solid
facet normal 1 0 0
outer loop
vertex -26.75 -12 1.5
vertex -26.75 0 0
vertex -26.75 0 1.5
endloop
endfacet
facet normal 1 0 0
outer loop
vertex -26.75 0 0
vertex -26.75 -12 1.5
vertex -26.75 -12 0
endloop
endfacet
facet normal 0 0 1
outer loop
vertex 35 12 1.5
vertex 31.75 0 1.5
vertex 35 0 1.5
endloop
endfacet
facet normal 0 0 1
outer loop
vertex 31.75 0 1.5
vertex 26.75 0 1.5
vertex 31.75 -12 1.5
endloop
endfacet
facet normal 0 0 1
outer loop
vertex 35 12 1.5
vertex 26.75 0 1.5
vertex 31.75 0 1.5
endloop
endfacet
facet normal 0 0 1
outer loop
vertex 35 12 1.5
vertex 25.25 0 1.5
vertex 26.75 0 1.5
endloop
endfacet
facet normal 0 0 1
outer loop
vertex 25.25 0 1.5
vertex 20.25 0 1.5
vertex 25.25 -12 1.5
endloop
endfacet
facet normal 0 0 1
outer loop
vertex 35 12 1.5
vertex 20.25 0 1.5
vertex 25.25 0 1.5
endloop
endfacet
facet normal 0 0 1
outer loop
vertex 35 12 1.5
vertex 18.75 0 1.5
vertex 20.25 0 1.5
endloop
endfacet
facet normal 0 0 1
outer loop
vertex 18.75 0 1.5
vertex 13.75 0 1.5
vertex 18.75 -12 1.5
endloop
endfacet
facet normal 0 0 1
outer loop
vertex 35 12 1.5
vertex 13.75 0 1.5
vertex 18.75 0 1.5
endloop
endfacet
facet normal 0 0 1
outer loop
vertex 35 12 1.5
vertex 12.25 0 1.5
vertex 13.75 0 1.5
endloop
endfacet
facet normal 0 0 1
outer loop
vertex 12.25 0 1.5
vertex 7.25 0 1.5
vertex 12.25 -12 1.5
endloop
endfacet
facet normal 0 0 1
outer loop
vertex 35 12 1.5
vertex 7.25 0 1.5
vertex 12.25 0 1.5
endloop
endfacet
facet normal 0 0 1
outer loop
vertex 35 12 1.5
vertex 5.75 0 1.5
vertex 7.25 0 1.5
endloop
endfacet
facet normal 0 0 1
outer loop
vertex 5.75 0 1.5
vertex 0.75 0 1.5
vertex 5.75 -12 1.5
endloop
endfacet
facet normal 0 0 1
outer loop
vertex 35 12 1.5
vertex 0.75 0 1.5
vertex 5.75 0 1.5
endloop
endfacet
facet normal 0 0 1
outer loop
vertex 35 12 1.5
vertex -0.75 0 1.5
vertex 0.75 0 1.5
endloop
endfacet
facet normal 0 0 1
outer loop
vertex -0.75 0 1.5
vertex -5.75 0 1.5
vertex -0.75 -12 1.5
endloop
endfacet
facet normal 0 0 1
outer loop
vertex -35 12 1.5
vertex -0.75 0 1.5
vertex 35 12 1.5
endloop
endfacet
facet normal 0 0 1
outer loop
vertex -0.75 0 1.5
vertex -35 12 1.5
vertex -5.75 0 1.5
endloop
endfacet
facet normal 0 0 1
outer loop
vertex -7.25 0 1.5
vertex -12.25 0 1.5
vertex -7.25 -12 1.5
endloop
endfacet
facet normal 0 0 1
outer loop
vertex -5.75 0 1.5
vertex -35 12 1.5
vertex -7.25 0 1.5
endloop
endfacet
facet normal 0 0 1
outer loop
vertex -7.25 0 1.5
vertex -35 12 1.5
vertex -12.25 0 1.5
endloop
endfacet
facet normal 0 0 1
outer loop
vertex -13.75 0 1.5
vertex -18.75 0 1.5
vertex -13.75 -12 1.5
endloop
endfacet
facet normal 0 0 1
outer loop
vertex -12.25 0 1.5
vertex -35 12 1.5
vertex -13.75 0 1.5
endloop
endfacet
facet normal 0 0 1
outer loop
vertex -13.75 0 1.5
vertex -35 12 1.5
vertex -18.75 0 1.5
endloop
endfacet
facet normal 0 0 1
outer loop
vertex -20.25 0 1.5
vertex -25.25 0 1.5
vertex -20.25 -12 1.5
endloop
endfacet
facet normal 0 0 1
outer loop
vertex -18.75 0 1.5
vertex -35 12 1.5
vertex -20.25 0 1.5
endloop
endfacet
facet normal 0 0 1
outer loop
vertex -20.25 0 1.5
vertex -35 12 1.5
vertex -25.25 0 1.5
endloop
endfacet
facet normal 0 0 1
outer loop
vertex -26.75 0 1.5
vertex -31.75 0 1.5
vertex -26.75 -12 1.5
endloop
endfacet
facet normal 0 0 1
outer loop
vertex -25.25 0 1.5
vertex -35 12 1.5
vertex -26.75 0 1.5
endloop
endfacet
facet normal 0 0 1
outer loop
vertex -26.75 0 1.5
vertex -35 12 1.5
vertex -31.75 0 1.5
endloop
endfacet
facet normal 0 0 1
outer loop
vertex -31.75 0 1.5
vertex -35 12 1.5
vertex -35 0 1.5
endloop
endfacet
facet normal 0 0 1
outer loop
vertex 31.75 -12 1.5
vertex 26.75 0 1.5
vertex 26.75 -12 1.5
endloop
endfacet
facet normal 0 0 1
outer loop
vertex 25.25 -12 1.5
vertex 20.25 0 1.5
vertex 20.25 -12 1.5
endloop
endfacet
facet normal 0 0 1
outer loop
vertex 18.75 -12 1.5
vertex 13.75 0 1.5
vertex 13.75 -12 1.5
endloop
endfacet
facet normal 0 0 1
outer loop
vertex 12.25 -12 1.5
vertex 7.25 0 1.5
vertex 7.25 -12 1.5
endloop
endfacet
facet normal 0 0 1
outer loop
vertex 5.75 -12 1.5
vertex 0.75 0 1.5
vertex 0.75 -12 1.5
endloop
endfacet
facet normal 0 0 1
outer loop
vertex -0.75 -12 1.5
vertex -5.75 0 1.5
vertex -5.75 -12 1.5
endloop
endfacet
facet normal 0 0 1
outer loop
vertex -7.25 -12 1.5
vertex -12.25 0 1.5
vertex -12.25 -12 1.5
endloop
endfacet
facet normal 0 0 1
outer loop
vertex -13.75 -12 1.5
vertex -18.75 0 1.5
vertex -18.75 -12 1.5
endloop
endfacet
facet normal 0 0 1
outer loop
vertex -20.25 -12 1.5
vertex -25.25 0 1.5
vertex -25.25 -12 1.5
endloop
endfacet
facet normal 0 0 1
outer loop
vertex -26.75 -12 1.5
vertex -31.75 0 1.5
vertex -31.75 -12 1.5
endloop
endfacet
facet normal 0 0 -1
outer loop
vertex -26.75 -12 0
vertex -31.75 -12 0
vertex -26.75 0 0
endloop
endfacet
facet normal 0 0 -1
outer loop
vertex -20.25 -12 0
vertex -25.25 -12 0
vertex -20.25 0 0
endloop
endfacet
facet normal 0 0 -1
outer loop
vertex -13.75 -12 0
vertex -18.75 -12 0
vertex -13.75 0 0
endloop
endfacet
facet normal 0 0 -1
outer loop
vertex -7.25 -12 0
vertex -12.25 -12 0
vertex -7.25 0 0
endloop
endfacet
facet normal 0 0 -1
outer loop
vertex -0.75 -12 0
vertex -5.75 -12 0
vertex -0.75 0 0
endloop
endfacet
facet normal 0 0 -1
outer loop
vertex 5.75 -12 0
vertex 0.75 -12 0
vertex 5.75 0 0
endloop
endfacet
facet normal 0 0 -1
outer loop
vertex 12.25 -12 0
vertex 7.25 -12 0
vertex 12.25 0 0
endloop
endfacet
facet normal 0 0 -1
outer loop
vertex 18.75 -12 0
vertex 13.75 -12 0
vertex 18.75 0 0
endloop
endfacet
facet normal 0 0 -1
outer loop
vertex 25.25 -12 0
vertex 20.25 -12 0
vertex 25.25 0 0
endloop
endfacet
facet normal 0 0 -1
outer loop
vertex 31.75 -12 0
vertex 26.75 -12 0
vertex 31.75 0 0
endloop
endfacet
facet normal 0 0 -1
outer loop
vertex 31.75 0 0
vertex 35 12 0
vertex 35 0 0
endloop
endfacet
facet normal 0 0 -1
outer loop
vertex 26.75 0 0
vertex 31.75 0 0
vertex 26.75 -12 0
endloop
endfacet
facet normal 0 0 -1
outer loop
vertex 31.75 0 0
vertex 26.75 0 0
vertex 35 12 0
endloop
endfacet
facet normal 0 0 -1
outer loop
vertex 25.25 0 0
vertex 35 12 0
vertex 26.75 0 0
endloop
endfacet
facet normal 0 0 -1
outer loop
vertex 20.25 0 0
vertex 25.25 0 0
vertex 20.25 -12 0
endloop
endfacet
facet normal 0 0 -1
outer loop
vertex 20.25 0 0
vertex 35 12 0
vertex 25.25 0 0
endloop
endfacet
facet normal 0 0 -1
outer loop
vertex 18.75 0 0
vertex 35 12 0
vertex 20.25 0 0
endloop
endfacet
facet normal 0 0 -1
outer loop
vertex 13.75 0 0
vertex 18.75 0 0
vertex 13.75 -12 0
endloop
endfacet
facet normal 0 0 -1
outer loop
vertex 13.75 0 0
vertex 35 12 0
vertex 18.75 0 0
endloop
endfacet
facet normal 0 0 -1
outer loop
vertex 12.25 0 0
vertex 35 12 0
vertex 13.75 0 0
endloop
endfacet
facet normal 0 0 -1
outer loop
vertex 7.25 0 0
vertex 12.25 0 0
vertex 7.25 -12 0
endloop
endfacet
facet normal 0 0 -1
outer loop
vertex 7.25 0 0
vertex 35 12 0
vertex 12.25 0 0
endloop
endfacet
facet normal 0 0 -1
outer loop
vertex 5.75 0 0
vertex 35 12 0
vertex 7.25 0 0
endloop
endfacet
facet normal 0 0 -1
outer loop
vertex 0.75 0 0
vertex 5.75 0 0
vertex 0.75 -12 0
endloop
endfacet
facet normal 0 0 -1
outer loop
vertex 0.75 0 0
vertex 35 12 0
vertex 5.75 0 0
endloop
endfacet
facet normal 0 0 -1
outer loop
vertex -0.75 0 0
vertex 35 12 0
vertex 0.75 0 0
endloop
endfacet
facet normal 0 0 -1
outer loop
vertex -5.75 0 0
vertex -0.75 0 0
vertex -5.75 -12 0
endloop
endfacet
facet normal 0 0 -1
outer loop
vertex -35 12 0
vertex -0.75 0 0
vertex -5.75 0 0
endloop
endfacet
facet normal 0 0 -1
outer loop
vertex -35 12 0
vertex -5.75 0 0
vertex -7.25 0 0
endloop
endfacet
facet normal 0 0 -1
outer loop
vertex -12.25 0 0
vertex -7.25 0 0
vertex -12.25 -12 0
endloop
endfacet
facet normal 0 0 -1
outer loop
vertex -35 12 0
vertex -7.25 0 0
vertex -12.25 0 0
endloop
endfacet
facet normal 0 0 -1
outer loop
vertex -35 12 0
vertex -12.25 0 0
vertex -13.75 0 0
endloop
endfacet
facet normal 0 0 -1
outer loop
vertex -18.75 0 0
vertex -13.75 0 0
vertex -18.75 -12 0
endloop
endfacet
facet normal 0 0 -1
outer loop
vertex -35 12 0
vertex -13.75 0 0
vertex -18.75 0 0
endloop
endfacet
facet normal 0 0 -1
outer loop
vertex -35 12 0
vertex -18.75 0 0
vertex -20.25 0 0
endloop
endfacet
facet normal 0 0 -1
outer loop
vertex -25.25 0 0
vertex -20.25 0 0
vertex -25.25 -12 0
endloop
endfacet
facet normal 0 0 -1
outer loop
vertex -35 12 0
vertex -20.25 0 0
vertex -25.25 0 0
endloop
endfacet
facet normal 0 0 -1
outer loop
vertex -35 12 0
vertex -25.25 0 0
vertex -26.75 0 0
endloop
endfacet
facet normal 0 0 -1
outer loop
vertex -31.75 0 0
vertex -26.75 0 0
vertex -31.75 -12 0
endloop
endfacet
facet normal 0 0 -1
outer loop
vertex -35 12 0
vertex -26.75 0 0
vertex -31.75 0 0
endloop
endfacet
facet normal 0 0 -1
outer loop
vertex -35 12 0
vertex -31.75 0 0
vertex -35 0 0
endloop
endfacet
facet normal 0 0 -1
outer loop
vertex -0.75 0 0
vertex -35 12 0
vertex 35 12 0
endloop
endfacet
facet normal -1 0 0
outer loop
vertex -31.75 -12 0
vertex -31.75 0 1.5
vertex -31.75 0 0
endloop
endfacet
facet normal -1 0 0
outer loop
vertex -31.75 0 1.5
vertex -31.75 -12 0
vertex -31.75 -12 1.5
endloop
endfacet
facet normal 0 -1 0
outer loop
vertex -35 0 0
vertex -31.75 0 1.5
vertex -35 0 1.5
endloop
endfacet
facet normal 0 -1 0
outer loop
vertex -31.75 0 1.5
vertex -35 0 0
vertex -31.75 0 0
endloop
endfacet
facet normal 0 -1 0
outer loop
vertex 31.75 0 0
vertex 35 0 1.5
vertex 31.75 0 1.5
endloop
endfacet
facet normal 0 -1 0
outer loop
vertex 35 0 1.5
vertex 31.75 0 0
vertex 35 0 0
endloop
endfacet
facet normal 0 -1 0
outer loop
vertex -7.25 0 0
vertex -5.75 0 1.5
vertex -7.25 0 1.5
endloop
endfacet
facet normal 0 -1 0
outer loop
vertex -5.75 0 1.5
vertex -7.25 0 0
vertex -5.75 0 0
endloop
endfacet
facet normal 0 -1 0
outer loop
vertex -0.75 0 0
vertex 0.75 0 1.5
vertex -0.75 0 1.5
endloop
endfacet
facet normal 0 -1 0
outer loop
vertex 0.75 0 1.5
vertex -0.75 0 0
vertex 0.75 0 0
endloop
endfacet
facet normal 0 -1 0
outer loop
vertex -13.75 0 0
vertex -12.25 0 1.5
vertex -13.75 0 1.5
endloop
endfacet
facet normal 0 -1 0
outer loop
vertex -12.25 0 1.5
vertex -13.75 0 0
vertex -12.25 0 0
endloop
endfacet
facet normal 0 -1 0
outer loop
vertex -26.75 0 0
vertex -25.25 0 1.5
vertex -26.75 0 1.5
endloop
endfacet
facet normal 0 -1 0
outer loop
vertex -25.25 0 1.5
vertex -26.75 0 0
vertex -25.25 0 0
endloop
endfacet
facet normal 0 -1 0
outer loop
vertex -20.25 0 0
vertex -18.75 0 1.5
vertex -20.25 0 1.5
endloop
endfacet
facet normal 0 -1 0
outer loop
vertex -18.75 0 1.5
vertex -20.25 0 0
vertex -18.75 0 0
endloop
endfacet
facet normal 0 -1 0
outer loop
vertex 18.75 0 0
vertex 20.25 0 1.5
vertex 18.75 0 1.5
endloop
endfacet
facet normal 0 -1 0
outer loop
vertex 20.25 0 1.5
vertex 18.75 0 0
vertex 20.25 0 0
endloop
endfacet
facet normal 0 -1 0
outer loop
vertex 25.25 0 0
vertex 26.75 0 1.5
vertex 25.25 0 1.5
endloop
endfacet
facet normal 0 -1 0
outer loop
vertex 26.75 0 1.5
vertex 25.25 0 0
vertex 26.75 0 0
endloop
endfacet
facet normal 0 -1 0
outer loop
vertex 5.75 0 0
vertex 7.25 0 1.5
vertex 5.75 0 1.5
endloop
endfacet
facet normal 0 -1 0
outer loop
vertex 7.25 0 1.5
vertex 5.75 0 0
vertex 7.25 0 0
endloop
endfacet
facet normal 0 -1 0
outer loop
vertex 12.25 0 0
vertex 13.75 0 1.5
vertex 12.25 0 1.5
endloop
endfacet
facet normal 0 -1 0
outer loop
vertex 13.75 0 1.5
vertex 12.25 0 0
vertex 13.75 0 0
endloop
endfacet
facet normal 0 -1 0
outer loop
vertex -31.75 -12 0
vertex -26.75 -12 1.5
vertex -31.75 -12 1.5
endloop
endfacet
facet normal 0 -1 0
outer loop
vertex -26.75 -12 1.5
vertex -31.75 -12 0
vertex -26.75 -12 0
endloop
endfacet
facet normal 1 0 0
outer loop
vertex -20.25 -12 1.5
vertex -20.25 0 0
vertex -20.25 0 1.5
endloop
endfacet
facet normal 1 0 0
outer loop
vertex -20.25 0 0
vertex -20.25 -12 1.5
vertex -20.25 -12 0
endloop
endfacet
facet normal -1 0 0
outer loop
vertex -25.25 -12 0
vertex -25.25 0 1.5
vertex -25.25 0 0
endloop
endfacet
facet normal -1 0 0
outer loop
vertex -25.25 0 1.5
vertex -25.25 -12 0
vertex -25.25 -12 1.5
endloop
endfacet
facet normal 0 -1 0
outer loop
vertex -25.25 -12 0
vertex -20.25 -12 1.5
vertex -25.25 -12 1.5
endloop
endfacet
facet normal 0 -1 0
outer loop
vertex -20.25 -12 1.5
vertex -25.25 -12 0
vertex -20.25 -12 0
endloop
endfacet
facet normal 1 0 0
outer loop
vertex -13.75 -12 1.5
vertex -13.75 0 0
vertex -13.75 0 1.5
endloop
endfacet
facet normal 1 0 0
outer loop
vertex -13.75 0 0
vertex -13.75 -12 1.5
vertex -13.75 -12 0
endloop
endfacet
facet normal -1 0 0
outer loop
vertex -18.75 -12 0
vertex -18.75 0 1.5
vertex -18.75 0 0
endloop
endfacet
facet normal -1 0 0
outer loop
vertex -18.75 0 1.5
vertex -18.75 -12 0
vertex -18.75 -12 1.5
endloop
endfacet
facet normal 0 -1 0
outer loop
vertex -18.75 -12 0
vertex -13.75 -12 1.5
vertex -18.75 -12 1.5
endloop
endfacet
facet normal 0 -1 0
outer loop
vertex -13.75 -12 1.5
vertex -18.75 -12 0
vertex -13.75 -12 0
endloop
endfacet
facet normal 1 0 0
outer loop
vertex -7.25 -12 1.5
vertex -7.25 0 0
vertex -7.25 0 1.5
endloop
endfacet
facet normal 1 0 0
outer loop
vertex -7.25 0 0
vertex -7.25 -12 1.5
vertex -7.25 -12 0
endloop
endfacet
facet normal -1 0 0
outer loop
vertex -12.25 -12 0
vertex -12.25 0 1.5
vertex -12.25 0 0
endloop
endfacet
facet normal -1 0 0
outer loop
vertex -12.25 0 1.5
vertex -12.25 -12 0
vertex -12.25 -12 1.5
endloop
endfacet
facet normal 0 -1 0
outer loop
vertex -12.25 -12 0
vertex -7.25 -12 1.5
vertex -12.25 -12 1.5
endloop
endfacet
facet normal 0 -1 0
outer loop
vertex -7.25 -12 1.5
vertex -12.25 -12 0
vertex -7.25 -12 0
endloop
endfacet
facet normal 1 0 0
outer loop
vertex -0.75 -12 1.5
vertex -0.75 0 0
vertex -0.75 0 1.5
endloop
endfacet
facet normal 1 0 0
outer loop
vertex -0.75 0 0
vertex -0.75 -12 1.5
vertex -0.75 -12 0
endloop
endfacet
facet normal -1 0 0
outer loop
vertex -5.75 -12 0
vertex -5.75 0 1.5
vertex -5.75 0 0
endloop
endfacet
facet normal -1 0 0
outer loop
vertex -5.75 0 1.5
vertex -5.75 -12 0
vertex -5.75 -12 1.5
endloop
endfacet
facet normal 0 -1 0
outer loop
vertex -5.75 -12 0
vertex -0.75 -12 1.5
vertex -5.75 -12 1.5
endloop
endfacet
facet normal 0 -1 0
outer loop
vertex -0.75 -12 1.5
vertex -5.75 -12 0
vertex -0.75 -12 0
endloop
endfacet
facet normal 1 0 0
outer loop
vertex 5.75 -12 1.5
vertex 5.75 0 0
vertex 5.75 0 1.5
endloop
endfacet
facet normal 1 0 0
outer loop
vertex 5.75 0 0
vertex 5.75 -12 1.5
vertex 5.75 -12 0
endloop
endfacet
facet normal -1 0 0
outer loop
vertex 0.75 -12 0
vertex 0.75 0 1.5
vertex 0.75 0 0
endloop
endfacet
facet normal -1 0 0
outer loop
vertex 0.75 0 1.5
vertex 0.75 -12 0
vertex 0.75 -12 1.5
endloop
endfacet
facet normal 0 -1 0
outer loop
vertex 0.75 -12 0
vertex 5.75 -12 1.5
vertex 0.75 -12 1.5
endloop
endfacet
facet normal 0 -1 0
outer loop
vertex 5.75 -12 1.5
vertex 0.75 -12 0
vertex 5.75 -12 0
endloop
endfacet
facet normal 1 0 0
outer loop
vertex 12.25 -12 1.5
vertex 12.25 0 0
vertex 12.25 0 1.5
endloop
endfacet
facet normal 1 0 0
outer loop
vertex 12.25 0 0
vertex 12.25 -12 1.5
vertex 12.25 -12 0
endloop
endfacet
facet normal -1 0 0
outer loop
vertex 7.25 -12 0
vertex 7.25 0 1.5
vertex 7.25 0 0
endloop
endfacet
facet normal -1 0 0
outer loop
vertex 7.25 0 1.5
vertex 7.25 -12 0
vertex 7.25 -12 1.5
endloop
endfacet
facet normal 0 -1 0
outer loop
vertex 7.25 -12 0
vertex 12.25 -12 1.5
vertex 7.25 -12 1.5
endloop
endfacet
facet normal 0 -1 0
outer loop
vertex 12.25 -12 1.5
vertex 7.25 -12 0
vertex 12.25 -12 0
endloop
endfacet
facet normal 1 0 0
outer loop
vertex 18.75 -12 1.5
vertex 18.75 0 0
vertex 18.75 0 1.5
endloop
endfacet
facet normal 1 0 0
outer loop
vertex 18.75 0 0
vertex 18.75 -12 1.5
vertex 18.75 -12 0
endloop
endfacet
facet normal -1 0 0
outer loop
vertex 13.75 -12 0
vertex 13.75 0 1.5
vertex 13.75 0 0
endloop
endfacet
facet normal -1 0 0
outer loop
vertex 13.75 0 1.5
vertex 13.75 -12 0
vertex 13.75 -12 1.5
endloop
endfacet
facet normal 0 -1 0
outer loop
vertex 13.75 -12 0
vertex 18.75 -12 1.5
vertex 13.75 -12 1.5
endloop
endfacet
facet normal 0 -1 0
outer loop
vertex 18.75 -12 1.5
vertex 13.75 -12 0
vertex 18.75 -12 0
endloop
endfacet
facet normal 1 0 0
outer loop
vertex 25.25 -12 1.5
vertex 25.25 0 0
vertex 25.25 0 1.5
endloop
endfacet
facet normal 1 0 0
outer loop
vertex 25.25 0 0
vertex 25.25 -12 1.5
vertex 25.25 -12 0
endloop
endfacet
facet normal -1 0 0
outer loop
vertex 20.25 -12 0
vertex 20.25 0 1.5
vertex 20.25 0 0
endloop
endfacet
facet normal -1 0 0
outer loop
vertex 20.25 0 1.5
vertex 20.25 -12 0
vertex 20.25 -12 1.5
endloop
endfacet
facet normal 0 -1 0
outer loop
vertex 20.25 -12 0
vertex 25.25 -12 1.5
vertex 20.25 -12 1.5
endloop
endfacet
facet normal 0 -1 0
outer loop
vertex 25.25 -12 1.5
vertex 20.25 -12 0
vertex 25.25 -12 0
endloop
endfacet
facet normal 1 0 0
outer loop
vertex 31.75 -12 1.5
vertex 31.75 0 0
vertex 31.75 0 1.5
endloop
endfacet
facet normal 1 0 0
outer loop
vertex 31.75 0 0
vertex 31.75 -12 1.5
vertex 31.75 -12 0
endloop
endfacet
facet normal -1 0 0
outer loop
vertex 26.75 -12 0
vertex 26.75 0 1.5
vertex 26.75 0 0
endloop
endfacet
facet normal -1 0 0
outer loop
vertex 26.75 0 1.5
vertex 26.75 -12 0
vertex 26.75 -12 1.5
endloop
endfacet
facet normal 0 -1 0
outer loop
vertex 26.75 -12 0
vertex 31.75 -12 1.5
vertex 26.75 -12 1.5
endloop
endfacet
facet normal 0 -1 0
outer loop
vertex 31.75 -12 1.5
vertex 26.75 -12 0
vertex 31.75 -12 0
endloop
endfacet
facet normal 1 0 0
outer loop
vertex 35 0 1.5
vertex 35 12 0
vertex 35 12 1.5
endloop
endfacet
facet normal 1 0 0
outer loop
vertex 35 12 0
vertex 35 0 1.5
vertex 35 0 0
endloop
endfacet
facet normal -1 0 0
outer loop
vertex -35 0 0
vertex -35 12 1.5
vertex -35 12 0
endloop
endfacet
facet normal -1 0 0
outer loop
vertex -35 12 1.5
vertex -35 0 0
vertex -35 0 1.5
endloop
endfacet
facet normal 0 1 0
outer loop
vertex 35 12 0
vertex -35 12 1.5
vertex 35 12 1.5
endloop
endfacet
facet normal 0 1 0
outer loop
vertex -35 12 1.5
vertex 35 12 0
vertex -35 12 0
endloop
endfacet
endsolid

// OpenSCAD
// 10-well comb for casting agarose gels
// Print orientation: flat on bed, spine (back bar) along +X, teeth in -Y

// ---------- Parameters ----------
spine_len   = 70;    // spine length along X (mm)
spine_wid   = 12;    // spine width along Y (mm)
plate_thk   = 1.5;   // comb plate thickness along Z (mm)

tooth_count = 10;    // number of teeth
tooth_w     = 5.0;   // tooth width along X (mm)
tooth_l     = 12;    // tooth length along Y (mm)
tooth_gap   = 1.5;   // gap between neighbouring teeth (mm)

eps         = 0.5;   // cutter overshoot past faces (mm)

$fn = 64;

// ---------- Derived ----------
pitch   = tooth_w + tooth_gap;              // centre-to-centre spacing
x_start = -(tooth_count - 1) * pitch / 2;   // first tooth centre, row centred on spine

// ---------- Model ----------
union() {
    // Spine (back bar)
    translate([-spine_len / 2, 0, 0])
        cube([spine_len, spine_wid, plate_thk]);

    // Teeth hanging in -Y
    for (i = [0 : tooth_count - 1])
        translate([x_start + i * pitch - tooth_w / 2, -tooth_l, 0])
            cube([tooth_w, tooth_l, plate_thk]);
}

// Cut the 10 square wells from the top face
difference() {
    // (teeth + spine) union as one solid
    union() {
        translate([-spine_len / 2, 0, 0])
            cube([spine_len, spine_wid, plate_thk]);
        for (i = [0 : tooth_count - 1])
            translate([x_start + i * pitch - tooth_w / 2, -tooth_l, 0])
                cube([tooth_w, tooth_l, plate_thk]);
    }

    // Well cutters, extended past the top face
    for (i = [0 : tooth_count - 1])
        translate([x_start + i * pitch - tooth_w / 2, -tooth_l - eps, eps])
            cube([tooth_w, tooth_l + 2 * eps, plate_thk + eps]);
}
